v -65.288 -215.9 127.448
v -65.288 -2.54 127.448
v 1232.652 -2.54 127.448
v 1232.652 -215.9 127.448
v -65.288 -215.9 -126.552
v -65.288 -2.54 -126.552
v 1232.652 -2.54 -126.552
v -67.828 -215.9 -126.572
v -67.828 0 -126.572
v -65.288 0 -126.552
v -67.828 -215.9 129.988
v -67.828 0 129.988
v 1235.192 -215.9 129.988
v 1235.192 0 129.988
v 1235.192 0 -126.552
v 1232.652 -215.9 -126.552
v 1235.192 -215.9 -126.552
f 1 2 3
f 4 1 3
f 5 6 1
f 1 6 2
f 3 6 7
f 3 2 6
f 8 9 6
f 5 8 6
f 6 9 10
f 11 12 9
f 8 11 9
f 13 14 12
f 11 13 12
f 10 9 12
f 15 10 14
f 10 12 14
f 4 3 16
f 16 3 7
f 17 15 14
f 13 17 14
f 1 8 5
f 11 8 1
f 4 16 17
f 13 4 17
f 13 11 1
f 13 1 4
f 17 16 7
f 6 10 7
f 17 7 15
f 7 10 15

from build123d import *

# Parameters (mm, degrees)
F1_DEPTH = 2.54
F2_DEPTH = 215.9


with BuildPart() as f1:
    # F0 (on Front) → F1 (new body)
    with BuildSketch(Plane.XZ):
        Polygon((-65.288178, -24.951821), (-65.288178, -126.551821), (-60.989264, -126.551821), (1232.651822, -126.551821), (1232.651822, 25.848179), (1232.651822, 127.448179), (-65.288178, 127.448179), align=None)
    extrude(amount=F1_DEPTH)

    # F0 (on Front) → F2 (join)
    with BuildSketch(Plane.XZ):
        Polygon((1235.191822, 129.988179), (-67.828178, 129.988179), (-67.828178, -24.951821), (-67.828178, -126.571611), (-65.288178, -126.551821), (-65.288178, -24.951821), (-65.288178, 127.448179), (1232.651822, 127.448179), (1232.651822, 25.848179), (1232.651822, -126.551821), (1235.191822, -126.551821), (1235.191822, -24.951821), align=None)
    extrude(amount=F2_DEPTH)


solid = f1.part
